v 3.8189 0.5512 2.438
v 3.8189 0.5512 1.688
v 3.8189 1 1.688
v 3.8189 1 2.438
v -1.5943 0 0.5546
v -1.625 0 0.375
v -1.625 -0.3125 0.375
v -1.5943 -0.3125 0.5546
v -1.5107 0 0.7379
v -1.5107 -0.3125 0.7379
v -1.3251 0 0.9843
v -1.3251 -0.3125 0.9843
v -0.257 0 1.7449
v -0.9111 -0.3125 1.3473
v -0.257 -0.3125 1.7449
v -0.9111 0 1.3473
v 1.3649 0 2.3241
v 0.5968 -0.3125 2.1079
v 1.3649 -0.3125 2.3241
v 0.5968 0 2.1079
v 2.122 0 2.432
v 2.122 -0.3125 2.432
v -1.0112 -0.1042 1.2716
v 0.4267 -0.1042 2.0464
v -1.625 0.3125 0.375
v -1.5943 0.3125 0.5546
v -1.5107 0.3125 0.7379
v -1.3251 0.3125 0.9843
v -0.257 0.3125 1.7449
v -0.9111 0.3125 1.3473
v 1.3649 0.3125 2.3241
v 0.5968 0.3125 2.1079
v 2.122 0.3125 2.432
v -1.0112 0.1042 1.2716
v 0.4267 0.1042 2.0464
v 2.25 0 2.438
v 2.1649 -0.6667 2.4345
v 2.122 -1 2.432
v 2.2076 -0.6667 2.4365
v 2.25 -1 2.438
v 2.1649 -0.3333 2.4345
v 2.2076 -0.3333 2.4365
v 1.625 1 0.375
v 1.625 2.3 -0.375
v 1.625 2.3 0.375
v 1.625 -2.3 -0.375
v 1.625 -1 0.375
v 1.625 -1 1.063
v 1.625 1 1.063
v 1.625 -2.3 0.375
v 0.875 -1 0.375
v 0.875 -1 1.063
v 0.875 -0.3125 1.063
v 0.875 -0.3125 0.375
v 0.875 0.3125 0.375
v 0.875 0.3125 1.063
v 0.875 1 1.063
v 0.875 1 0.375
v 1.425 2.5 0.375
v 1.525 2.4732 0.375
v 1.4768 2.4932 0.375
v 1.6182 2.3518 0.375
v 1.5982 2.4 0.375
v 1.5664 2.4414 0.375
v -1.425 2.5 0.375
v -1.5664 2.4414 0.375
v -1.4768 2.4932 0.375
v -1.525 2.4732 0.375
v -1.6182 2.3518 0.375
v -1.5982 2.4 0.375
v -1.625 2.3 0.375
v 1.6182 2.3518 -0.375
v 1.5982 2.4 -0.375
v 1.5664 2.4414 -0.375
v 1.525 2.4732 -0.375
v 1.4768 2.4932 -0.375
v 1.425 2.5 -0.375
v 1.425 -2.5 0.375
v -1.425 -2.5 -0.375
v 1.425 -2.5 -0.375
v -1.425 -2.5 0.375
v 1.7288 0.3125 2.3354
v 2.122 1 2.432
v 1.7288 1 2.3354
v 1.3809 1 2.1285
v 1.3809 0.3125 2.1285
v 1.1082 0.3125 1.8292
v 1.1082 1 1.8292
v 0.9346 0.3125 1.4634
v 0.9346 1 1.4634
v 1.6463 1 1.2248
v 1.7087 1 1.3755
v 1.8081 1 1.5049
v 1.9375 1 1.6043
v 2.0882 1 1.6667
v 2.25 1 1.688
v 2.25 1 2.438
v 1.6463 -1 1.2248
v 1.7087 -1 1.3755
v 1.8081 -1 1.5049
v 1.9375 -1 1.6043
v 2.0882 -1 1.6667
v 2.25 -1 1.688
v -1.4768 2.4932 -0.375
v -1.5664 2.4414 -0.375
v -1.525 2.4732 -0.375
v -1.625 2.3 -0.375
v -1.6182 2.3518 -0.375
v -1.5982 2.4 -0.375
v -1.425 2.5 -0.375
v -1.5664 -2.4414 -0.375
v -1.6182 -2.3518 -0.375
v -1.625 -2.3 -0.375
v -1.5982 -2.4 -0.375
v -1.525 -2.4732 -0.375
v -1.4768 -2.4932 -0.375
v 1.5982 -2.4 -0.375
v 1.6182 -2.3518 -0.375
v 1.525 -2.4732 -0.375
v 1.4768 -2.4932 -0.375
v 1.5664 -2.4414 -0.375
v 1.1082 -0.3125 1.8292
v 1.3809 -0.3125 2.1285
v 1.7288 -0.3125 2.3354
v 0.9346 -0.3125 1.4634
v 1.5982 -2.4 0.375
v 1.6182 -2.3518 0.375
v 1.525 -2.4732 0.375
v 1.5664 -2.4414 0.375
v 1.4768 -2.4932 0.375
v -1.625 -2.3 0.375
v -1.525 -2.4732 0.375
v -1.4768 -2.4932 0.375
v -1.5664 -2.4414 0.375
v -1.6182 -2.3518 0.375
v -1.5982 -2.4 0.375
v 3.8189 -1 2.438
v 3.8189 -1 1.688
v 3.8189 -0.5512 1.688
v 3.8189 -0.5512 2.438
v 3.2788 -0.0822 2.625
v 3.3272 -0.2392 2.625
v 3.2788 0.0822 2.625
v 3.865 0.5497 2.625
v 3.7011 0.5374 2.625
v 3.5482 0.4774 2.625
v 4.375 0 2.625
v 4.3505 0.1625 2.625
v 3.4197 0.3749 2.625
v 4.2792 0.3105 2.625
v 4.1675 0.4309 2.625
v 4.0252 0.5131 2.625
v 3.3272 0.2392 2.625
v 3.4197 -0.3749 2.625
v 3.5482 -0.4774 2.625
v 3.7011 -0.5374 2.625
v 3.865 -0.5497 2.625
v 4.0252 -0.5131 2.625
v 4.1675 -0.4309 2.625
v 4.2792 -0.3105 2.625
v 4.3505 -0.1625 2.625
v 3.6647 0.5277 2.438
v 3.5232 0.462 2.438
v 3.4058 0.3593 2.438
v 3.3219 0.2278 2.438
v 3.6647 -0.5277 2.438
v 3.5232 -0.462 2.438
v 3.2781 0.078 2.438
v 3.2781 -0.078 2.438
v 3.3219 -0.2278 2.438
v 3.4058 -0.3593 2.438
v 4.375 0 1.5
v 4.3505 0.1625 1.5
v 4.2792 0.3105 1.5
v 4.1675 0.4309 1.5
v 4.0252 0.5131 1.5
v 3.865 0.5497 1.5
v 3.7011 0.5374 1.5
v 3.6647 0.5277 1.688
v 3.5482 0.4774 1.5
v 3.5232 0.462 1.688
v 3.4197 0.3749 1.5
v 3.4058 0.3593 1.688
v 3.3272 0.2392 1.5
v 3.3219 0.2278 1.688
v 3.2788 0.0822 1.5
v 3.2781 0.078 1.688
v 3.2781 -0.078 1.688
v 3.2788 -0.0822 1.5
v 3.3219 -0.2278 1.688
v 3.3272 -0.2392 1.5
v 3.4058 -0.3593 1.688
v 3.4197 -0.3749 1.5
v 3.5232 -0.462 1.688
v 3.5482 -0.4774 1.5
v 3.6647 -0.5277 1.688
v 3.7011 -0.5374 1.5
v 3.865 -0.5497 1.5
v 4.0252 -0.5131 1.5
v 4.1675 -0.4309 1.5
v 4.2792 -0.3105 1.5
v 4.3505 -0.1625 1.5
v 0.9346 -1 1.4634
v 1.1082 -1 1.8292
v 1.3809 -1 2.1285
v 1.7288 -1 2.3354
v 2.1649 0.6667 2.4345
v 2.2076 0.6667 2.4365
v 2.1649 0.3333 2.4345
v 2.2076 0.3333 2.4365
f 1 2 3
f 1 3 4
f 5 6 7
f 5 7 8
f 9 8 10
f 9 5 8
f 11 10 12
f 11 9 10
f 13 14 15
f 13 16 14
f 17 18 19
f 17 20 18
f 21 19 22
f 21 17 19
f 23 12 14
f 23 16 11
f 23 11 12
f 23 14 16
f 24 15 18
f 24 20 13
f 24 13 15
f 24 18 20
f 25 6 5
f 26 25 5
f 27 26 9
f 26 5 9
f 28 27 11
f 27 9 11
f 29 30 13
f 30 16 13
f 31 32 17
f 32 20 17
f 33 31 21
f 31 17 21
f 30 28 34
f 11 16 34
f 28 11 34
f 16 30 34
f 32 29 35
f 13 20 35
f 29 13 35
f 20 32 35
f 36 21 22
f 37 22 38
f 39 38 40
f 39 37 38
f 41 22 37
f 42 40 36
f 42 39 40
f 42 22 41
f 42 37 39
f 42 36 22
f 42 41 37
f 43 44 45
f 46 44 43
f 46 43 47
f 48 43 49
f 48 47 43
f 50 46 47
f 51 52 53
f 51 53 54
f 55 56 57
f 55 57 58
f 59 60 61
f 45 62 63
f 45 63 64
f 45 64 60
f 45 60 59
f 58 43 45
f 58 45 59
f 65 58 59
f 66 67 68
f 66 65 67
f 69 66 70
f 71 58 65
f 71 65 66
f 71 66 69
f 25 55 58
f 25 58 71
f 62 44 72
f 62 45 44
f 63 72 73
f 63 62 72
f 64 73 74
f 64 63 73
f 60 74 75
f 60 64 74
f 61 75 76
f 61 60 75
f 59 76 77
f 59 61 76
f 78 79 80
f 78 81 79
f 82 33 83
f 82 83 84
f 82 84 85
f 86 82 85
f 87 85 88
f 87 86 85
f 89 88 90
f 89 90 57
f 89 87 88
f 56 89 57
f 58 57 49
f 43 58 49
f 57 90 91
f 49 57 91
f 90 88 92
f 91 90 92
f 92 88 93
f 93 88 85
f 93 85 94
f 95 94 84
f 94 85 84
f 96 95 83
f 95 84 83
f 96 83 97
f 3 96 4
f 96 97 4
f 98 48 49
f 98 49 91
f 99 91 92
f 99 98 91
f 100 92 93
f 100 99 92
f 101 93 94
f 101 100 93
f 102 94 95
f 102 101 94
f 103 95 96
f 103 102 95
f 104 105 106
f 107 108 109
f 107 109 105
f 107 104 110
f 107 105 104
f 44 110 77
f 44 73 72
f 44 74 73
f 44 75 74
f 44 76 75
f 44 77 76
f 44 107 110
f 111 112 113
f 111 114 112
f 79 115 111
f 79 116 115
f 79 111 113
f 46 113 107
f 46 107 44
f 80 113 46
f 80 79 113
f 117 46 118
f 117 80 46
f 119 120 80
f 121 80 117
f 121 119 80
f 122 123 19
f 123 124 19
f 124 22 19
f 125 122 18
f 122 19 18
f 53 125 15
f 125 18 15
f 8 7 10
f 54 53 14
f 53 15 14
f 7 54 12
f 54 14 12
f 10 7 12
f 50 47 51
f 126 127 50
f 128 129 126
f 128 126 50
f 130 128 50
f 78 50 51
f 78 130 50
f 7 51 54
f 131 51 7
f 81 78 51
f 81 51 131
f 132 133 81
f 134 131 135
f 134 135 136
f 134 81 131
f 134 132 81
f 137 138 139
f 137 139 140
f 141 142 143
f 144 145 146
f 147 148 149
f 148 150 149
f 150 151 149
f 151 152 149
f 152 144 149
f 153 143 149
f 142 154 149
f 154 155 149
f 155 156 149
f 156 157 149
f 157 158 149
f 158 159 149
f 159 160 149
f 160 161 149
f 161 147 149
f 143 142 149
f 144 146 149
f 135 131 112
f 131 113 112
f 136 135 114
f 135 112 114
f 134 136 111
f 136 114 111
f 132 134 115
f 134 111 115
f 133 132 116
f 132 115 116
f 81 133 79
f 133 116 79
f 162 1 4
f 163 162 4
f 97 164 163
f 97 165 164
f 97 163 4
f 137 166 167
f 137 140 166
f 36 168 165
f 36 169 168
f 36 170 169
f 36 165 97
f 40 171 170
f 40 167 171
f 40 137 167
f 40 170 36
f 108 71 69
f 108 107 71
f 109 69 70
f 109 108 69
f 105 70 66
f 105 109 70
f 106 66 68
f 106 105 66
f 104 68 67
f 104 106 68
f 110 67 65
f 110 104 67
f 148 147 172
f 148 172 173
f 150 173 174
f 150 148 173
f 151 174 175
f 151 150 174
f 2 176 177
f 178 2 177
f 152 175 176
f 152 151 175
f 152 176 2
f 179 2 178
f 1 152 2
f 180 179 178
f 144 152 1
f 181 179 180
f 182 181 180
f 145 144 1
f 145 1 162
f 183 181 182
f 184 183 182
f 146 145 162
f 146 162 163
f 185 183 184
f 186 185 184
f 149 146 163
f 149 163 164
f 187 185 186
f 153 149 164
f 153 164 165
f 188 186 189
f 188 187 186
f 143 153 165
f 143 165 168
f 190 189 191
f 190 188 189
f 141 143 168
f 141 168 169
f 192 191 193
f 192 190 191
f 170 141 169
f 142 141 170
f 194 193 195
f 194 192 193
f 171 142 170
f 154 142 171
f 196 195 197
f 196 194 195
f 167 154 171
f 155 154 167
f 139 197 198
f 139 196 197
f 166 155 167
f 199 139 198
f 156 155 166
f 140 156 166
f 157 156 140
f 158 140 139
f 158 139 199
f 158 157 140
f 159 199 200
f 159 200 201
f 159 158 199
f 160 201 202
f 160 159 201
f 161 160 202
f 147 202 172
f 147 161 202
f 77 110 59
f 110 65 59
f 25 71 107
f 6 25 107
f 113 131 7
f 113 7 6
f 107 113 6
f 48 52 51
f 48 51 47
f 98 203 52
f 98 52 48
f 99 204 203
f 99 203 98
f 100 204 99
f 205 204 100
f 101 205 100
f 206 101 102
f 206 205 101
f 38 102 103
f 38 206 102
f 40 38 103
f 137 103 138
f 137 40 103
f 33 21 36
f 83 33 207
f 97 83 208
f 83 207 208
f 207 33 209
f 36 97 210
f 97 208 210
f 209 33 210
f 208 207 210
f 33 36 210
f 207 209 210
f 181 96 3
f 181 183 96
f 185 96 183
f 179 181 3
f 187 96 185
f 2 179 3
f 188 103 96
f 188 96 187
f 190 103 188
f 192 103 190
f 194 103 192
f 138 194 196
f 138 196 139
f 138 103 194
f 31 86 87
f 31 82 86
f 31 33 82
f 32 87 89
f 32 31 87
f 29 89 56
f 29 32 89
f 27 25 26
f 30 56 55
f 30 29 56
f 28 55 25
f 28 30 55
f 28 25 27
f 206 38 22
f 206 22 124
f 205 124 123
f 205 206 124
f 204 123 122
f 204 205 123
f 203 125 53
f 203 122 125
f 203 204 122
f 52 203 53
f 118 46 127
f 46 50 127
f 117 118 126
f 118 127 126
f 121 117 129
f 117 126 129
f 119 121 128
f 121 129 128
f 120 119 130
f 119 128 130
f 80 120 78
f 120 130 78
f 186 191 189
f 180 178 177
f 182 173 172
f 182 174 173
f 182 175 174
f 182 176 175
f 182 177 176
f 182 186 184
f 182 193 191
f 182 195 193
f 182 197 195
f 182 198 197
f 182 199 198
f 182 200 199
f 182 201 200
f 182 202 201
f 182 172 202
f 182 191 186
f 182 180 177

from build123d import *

# Parameters (mm, degrees)
F1_DEPTH = 2.5
F0_W     = 1.443921
F0_H     = 0.75
F2_DEPTH = 1
F3_DEPTH = 0.3125
F0_W_2   = 0.551202
F0_H_2   = 1.125
F5_R     = 0.2


with BuildPart() as f1:
    # F0 (on Front) → F1 (new body, symmetric)
    with BuildSketch(Plane.XZ):
        Polygon((-1.625, -0.375), (1.625, -0.375), (1.625, 0.375), (0.875, 0.375), (-1.625, 0.375), align=None)
    extrude(amount=F1_DEPTH, both=True)

    # F0 (on Front) → F2 (join, symmetric)
    with BuildSketch(Plane.XZ):
        with BuildLine():
            Line((0.875, 0.375), (1.625, 0.375))
            Line((1.625, 0.375), (1.625, 1.063))
            ThreePointArc((1.625, 1.063), (1.808058, 1.504942), (2.25, 1.688))
            Line((2.25, 1.688), (2.375, 1.688))
            Line((2.375, 1.688), (2.375, 2.438))
            Line((2.375, 2.438), (2.25, 2.438))
            add(Edge.make_bspline(
                [(2.121971, 2.432026), (2.164984, 2.434706), (2.207675, 2.436705), (2.25, 2.438)],
                knots=[4.277425, 4.277425, 4.277425, 4.277425, 4.389942, 4.389942, 4.389942, 4.389942], degree=3))
            ThreePointArc((2.121971, 2.432026), (1.23347, 1.988901), (0.875, 1.063))
            Line((0.875, 1.063), (0.875, 0.375))
        make_face()
        with Locations((3.09696, 2.063)):
            Rectangle(F0_W, F0_H)
    extrude(amount=F2_DEPTH, both=True)

    # F0 (on Front) → F3 (join, symmetric)
    with BuildSketch(Plane.XZ):
        with BuildLine():
            add(Edge.make_bspline(
                [(-1.625, 0.375), (-1.612032, 1.243352), (0.486814, 2.330145), (2.121971, 2.432026)],
                knots=[0, 0, 0, 0, 4.277425, 4.277425, 4.277425, 4.277425], degree=3))
            Line((-1.625, 0.375), (0.875, 0.375))
            Line((0.875, 0.375), (0.875, 1.063))
            ThreePointArc((0.875, 1.063), (1.23347, 1.988901), (2.121971, 2.432026))
        make_face()
    extrude(amount=F3_DEPTH, both=True)

    # F0 (on Front) → F4 (revolve)
    with BuildSketch(Plane.XZ):
        with Locations((4.099399, 2.0625)):
            Rectangle(F0_W_2, F0_H_2)
    revolve(axis=Axis((3.823798, 0, 2.0625), (0, 0, 1)))

    # F5
    f5_edges = [f1.edges().sort_by_distance(p)[0] for p in [
        (-1.625, -2.5, 0),
        (1.625, -2.5, 0),
        (1.625, 2.5, 0),
        (-1.625, 2.5, 0),
    ]]
    fillet(f5_edges, radius=F5_R)


solid = f1.part
